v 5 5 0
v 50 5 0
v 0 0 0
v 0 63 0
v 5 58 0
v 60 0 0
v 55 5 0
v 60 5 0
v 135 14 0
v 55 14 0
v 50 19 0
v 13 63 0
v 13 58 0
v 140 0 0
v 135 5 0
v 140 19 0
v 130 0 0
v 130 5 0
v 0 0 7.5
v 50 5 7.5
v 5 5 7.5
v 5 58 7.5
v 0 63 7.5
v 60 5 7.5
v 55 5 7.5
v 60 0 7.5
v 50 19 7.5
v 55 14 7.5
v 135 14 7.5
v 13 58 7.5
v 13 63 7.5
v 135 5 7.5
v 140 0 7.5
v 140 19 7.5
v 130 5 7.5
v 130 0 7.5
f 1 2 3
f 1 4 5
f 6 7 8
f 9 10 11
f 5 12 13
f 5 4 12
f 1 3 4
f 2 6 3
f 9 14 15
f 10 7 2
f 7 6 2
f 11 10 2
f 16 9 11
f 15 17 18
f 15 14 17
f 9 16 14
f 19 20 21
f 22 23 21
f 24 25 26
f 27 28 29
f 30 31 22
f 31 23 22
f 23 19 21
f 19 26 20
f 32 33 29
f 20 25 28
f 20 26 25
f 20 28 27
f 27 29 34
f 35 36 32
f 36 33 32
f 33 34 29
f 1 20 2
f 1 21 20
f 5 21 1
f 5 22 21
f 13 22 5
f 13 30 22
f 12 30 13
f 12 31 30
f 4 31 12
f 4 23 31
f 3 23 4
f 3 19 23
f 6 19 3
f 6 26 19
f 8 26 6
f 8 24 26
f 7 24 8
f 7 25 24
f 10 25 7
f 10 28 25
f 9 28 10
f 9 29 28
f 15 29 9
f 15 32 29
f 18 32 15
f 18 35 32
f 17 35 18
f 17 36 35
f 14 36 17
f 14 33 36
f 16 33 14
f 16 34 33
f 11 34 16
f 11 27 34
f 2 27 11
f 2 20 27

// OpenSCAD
//Width of the bracket itself
bracket_width = 7.5;
//Thickness of the walls of the bracket
bracket_wall = 5;

//Makerbot frame depth (measured from the front to the interior)
depth = 53;
//Makerbot frame height (measured from the top to the interior)
height = 45;
//Makerbot frame thickness (the thickness of the panels)
thickness = 8;

//Width of your phone
phone_width = 80;
//Thickness of your phone
phone_depth = 9;
//Phone overhang
phone_overhang = 5;

//Does the phone mount go over the screen or the back?
_back_mount = 1; // [0:Front, 1:Back]
back_mount = _back_mount == 1;

/* [Hidden] */

linear_extrude(bracket_width) {
	square([bracket_wall, depth + bracket_wall * 2]);
	translate([bracket_wall, 0])
		square([height + bracket_wall, bracket_wall]);
	translate([height + bracket_wall, bracket_wall])
		square([bracket_wall, phone_depth + bracket_wall]);
	translate([bracket_wall, depth + bracket_wall])
		square([thickness, bracket_wall]);
	translate([bracket_wall * 2 + height + phone_width, 0])
		square([bracket_wall, phone_depth + bracket_wall * 2]);
	
	if(back_mount) {
		translate([bracket_wall + height, bracket_wall + phone_depth/*0*/])
			square([phone_width + bracket_wall * 2, bracket_wall]);
		translate([bracket_wall * 2 + height + phone_width - phone_overhang, 0/*bracket_wall + phone_depth*/])
			square([phone_overhang, bracket_wall]);
		translate([height + bracket_wall * 2, 0/*bracket_wall + phone_depth*/])
			square([phone_overhang, bracket_wall]);
	} else {
		translate([bracket_wall + height, 0])
			square([phone_width + bracket_wall * 2, bracket_wall]);
		translate([bracket_wall * 2 + height + phone_width - phone_overhang, bracket_wall + phone_depth])
			square([phone_overhang, bracket_wall]);
		translate([height + bracket_wall * 2, bracket_wall + phone_depth])
			square([phone_overhang, bracket_wall]);
	}
}
